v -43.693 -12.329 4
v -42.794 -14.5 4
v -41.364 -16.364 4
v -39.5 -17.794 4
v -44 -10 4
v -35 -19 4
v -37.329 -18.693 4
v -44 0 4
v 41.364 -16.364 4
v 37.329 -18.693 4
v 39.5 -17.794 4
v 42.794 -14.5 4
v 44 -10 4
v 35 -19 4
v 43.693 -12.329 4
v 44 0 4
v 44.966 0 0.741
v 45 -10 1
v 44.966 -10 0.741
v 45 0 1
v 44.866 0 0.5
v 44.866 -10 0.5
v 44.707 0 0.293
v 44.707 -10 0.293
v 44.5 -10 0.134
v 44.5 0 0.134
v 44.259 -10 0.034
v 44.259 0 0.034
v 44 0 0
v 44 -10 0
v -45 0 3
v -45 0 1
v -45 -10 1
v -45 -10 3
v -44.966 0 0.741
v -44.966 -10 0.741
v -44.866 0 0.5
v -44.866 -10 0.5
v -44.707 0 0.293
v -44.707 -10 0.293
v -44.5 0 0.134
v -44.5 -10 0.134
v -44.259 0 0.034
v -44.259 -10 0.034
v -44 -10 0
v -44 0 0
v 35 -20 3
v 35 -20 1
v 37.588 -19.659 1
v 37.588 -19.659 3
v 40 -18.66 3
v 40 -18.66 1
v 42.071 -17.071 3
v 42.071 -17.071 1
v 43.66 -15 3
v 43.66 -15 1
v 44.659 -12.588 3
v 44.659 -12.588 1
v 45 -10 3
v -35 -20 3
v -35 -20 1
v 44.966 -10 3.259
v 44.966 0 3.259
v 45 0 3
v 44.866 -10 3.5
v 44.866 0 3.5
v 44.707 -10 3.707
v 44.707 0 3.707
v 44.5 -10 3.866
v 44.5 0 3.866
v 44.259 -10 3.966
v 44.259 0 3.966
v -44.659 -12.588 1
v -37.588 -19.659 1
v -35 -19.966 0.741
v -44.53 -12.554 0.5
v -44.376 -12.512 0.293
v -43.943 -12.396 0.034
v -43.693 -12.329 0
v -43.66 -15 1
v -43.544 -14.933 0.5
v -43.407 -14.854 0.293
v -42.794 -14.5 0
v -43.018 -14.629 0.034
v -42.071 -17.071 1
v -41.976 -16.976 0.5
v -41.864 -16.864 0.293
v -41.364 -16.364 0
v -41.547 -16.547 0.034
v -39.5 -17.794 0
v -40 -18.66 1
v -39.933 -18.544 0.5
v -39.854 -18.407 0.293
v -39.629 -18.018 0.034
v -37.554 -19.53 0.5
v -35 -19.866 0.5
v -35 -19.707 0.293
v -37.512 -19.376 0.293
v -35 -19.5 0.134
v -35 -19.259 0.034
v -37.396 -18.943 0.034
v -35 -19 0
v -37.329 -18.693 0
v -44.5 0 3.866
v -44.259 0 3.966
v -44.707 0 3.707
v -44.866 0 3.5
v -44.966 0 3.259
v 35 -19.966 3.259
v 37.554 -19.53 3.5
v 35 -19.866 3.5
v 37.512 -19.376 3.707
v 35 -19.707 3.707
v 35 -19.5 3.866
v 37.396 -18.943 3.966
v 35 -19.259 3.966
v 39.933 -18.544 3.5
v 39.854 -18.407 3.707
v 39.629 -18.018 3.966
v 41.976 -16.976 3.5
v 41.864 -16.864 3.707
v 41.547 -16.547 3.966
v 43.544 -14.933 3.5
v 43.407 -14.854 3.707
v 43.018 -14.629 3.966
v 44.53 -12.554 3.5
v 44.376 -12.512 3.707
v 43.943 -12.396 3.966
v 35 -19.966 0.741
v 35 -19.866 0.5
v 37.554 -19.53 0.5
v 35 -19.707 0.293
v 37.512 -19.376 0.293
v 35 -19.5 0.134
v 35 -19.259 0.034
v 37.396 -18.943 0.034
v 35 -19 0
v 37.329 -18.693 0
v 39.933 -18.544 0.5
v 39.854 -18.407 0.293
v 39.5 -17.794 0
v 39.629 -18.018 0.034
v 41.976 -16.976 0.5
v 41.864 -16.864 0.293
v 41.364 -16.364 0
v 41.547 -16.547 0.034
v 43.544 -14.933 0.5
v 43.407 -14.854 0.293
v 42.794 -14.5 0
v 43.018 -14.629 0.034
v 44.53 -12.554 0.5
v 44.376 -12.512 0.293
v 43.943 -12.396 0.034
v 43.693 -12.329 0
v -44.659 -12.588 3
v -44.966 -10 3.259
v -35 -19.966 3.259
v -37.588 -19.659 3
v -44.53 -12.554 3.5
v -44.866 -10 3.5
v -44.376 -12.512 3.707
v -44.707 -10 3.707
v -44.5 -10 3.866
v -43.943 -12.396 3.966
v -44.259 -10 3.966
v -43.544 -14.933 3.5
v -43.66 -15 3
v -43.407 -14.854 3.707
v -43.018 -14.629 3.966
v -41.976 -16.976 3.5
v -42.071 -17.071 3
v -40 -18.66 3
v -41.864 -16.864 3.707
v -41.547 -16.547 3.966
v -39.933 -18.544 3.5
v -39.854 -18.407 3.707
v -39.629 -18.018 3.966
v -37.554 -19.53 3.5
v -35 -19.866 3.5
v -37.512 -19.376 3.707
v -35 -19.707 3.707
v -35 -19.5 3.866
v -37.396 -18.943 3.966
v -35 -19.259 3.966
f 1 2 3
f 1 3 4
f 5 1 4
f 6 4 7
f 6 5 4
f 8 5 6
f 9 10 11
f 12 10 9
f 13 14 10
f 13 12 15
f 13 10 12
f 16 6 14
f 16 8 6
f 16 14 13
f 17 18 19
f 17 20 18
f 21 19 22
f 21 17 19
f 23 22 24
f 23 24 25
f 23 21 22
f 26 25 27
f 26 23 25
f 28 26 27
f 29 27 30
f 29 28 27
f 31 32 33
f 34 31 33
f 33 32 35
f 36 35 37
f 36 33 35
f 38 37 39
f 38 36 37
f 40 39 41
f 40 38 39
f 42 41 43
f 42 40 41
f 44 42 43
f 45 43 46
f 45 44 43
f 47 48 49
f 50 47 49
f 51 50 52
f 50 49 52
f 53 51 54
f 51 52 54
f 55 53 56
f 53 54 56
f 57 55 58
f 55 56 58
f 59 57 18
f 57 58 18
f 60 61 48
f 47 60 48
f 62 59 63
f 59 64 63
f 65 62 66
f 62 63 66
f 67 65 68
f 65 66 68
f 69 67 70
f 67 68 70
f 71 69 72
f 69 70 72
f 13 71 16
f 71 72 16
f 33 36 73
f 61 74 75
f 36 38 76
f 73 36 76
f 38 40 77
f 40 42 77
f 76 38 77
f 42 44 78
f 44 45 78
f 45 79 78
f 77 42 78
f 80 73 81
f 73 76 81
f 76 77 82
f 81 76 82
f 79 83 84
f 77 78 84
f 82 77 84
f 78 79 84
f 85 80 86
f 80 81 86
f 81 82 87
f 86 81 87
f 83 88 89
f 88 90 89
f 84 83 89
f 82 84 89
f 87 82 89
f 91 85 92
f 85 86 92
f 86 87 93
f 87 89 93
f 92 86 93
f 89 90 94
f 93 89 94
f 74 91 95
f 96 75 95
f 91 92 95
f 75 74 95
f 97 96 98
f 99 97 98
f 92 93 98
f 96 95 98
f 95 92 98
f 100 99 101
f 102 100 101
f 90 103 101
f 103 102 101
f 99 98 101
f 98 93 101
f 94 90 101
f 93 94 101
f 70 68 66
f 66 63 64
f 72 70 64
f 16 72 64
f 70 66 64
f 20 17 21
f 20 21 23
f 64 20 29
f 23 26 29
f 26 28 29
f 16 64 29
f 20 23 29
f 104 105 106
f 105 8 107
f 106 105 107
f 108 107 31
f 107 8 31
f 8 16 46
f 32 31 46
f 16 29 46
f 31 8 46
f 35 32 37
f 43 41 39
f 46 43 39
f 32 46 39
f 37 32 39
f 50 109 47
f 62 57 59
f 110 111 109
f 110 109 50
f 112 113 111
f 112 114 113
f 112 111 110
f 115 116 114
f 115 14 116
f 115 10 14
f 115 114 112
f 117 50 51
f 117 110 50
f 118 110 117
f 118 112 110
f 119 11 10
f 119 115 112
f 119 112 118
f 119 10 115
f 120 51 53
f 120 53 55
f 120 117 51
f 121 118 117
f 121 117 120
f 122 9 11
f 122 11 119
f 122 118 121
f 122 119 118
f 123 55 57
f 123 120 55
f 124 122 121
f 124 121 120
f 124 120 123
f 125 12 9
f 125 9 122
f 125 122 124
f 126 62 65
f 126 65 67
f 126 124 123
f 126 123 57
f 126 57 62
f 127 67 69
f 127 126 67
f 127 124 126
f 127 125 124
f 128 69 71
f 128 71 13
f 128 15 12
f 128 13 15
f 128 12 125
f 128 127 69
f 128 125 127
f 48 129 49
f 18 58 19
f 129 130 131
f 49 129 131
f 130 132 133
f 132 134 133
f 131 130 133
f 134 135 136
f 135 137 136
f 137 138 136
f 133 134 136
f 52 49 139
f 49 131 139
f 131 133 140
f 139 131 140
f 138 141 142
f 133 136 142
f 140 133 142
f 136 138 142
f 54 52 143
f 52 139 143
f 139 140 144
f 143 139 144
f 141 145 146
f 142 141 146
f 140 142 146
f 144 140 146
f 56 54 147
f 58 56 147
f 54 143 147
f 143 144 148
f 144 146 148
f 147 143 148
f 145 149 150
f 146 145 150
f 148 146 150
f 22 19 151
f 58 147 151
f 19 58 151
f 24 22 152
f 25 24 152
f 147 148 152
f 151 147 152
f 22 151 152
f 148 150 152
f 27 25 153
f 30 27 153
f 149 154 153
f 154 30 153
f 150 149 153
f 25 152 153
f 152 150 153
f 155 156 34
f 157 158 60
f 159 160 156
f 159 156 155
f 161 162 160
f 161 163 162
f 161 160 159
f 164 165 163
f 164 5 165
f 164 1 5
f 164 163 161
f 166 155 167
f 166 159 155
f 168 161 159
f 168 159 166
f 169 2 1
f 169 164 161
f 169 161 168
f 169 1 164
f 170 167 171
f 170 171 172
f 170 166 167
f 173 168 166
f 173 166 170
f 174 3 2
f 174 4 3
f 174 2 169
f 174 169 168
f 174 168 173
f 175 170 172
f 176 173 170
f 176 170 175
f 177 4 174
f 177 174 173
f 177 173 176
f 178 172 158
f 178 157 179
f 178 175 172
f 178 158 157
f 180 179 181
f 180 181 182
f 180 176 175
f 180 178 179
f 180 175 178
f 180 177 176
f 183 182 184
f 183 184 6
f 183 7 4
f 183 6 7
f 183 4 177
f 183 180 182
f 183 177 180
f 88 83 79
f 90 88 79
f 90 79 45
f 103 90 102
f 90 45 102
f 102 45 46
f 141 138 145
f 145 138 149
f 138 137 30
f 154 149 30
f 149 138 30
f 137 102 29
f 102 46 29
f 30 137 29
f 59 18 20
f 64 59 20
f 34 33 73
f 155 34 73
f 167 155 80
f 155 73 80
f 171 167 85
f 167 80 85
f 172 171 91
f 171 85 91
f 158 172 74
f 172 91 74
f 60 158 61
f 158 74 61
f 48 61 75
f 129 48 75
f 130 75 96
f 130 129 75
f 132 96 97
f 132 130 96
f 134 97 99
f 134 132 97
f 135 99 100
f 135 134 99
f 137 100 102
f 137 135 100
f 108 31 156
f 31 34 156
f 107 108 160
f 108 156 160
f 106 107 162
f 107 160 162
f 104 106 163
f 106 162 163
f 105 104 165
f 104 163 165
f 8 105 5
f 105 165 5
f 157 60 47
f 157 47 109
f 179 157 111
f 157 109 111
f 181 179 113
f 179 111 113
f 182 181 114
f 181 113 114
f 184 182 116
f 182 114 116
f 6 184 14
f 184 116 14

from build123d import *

# Parameters (mm, degrees)
F1_DEPTH = 4
F2_R     = 1


with BuildPart() as f1:
    # F0 (on Top) → F1 (new body)
    with BuildSketch(Plane.XY):
        with BuildLine():
            Line((45, 0), (-45, 0))
            Line((-45, 0), (-45, -10))
            ThreePointArc((-45, -10), (-42.071068, -17.071068), (-35, -20))
            Line((-35, -20), (35, -20))
            ThreePointArc((35, -20), (42.071068, -17.071068), (45, -10))
            Line((45, -10), (45, 0))
        make_face()
    extrude(amount=F1_DEPTH)

    # F2
    f2_edges = [f1.edges().sort_by_distance(p)[0] for p in [
        (-45, -5, 4),
        (-42.071068, -17.071068, 0),
    ]]
    fillet(f2_edges, radius=F2_R)


solid = f1.part
